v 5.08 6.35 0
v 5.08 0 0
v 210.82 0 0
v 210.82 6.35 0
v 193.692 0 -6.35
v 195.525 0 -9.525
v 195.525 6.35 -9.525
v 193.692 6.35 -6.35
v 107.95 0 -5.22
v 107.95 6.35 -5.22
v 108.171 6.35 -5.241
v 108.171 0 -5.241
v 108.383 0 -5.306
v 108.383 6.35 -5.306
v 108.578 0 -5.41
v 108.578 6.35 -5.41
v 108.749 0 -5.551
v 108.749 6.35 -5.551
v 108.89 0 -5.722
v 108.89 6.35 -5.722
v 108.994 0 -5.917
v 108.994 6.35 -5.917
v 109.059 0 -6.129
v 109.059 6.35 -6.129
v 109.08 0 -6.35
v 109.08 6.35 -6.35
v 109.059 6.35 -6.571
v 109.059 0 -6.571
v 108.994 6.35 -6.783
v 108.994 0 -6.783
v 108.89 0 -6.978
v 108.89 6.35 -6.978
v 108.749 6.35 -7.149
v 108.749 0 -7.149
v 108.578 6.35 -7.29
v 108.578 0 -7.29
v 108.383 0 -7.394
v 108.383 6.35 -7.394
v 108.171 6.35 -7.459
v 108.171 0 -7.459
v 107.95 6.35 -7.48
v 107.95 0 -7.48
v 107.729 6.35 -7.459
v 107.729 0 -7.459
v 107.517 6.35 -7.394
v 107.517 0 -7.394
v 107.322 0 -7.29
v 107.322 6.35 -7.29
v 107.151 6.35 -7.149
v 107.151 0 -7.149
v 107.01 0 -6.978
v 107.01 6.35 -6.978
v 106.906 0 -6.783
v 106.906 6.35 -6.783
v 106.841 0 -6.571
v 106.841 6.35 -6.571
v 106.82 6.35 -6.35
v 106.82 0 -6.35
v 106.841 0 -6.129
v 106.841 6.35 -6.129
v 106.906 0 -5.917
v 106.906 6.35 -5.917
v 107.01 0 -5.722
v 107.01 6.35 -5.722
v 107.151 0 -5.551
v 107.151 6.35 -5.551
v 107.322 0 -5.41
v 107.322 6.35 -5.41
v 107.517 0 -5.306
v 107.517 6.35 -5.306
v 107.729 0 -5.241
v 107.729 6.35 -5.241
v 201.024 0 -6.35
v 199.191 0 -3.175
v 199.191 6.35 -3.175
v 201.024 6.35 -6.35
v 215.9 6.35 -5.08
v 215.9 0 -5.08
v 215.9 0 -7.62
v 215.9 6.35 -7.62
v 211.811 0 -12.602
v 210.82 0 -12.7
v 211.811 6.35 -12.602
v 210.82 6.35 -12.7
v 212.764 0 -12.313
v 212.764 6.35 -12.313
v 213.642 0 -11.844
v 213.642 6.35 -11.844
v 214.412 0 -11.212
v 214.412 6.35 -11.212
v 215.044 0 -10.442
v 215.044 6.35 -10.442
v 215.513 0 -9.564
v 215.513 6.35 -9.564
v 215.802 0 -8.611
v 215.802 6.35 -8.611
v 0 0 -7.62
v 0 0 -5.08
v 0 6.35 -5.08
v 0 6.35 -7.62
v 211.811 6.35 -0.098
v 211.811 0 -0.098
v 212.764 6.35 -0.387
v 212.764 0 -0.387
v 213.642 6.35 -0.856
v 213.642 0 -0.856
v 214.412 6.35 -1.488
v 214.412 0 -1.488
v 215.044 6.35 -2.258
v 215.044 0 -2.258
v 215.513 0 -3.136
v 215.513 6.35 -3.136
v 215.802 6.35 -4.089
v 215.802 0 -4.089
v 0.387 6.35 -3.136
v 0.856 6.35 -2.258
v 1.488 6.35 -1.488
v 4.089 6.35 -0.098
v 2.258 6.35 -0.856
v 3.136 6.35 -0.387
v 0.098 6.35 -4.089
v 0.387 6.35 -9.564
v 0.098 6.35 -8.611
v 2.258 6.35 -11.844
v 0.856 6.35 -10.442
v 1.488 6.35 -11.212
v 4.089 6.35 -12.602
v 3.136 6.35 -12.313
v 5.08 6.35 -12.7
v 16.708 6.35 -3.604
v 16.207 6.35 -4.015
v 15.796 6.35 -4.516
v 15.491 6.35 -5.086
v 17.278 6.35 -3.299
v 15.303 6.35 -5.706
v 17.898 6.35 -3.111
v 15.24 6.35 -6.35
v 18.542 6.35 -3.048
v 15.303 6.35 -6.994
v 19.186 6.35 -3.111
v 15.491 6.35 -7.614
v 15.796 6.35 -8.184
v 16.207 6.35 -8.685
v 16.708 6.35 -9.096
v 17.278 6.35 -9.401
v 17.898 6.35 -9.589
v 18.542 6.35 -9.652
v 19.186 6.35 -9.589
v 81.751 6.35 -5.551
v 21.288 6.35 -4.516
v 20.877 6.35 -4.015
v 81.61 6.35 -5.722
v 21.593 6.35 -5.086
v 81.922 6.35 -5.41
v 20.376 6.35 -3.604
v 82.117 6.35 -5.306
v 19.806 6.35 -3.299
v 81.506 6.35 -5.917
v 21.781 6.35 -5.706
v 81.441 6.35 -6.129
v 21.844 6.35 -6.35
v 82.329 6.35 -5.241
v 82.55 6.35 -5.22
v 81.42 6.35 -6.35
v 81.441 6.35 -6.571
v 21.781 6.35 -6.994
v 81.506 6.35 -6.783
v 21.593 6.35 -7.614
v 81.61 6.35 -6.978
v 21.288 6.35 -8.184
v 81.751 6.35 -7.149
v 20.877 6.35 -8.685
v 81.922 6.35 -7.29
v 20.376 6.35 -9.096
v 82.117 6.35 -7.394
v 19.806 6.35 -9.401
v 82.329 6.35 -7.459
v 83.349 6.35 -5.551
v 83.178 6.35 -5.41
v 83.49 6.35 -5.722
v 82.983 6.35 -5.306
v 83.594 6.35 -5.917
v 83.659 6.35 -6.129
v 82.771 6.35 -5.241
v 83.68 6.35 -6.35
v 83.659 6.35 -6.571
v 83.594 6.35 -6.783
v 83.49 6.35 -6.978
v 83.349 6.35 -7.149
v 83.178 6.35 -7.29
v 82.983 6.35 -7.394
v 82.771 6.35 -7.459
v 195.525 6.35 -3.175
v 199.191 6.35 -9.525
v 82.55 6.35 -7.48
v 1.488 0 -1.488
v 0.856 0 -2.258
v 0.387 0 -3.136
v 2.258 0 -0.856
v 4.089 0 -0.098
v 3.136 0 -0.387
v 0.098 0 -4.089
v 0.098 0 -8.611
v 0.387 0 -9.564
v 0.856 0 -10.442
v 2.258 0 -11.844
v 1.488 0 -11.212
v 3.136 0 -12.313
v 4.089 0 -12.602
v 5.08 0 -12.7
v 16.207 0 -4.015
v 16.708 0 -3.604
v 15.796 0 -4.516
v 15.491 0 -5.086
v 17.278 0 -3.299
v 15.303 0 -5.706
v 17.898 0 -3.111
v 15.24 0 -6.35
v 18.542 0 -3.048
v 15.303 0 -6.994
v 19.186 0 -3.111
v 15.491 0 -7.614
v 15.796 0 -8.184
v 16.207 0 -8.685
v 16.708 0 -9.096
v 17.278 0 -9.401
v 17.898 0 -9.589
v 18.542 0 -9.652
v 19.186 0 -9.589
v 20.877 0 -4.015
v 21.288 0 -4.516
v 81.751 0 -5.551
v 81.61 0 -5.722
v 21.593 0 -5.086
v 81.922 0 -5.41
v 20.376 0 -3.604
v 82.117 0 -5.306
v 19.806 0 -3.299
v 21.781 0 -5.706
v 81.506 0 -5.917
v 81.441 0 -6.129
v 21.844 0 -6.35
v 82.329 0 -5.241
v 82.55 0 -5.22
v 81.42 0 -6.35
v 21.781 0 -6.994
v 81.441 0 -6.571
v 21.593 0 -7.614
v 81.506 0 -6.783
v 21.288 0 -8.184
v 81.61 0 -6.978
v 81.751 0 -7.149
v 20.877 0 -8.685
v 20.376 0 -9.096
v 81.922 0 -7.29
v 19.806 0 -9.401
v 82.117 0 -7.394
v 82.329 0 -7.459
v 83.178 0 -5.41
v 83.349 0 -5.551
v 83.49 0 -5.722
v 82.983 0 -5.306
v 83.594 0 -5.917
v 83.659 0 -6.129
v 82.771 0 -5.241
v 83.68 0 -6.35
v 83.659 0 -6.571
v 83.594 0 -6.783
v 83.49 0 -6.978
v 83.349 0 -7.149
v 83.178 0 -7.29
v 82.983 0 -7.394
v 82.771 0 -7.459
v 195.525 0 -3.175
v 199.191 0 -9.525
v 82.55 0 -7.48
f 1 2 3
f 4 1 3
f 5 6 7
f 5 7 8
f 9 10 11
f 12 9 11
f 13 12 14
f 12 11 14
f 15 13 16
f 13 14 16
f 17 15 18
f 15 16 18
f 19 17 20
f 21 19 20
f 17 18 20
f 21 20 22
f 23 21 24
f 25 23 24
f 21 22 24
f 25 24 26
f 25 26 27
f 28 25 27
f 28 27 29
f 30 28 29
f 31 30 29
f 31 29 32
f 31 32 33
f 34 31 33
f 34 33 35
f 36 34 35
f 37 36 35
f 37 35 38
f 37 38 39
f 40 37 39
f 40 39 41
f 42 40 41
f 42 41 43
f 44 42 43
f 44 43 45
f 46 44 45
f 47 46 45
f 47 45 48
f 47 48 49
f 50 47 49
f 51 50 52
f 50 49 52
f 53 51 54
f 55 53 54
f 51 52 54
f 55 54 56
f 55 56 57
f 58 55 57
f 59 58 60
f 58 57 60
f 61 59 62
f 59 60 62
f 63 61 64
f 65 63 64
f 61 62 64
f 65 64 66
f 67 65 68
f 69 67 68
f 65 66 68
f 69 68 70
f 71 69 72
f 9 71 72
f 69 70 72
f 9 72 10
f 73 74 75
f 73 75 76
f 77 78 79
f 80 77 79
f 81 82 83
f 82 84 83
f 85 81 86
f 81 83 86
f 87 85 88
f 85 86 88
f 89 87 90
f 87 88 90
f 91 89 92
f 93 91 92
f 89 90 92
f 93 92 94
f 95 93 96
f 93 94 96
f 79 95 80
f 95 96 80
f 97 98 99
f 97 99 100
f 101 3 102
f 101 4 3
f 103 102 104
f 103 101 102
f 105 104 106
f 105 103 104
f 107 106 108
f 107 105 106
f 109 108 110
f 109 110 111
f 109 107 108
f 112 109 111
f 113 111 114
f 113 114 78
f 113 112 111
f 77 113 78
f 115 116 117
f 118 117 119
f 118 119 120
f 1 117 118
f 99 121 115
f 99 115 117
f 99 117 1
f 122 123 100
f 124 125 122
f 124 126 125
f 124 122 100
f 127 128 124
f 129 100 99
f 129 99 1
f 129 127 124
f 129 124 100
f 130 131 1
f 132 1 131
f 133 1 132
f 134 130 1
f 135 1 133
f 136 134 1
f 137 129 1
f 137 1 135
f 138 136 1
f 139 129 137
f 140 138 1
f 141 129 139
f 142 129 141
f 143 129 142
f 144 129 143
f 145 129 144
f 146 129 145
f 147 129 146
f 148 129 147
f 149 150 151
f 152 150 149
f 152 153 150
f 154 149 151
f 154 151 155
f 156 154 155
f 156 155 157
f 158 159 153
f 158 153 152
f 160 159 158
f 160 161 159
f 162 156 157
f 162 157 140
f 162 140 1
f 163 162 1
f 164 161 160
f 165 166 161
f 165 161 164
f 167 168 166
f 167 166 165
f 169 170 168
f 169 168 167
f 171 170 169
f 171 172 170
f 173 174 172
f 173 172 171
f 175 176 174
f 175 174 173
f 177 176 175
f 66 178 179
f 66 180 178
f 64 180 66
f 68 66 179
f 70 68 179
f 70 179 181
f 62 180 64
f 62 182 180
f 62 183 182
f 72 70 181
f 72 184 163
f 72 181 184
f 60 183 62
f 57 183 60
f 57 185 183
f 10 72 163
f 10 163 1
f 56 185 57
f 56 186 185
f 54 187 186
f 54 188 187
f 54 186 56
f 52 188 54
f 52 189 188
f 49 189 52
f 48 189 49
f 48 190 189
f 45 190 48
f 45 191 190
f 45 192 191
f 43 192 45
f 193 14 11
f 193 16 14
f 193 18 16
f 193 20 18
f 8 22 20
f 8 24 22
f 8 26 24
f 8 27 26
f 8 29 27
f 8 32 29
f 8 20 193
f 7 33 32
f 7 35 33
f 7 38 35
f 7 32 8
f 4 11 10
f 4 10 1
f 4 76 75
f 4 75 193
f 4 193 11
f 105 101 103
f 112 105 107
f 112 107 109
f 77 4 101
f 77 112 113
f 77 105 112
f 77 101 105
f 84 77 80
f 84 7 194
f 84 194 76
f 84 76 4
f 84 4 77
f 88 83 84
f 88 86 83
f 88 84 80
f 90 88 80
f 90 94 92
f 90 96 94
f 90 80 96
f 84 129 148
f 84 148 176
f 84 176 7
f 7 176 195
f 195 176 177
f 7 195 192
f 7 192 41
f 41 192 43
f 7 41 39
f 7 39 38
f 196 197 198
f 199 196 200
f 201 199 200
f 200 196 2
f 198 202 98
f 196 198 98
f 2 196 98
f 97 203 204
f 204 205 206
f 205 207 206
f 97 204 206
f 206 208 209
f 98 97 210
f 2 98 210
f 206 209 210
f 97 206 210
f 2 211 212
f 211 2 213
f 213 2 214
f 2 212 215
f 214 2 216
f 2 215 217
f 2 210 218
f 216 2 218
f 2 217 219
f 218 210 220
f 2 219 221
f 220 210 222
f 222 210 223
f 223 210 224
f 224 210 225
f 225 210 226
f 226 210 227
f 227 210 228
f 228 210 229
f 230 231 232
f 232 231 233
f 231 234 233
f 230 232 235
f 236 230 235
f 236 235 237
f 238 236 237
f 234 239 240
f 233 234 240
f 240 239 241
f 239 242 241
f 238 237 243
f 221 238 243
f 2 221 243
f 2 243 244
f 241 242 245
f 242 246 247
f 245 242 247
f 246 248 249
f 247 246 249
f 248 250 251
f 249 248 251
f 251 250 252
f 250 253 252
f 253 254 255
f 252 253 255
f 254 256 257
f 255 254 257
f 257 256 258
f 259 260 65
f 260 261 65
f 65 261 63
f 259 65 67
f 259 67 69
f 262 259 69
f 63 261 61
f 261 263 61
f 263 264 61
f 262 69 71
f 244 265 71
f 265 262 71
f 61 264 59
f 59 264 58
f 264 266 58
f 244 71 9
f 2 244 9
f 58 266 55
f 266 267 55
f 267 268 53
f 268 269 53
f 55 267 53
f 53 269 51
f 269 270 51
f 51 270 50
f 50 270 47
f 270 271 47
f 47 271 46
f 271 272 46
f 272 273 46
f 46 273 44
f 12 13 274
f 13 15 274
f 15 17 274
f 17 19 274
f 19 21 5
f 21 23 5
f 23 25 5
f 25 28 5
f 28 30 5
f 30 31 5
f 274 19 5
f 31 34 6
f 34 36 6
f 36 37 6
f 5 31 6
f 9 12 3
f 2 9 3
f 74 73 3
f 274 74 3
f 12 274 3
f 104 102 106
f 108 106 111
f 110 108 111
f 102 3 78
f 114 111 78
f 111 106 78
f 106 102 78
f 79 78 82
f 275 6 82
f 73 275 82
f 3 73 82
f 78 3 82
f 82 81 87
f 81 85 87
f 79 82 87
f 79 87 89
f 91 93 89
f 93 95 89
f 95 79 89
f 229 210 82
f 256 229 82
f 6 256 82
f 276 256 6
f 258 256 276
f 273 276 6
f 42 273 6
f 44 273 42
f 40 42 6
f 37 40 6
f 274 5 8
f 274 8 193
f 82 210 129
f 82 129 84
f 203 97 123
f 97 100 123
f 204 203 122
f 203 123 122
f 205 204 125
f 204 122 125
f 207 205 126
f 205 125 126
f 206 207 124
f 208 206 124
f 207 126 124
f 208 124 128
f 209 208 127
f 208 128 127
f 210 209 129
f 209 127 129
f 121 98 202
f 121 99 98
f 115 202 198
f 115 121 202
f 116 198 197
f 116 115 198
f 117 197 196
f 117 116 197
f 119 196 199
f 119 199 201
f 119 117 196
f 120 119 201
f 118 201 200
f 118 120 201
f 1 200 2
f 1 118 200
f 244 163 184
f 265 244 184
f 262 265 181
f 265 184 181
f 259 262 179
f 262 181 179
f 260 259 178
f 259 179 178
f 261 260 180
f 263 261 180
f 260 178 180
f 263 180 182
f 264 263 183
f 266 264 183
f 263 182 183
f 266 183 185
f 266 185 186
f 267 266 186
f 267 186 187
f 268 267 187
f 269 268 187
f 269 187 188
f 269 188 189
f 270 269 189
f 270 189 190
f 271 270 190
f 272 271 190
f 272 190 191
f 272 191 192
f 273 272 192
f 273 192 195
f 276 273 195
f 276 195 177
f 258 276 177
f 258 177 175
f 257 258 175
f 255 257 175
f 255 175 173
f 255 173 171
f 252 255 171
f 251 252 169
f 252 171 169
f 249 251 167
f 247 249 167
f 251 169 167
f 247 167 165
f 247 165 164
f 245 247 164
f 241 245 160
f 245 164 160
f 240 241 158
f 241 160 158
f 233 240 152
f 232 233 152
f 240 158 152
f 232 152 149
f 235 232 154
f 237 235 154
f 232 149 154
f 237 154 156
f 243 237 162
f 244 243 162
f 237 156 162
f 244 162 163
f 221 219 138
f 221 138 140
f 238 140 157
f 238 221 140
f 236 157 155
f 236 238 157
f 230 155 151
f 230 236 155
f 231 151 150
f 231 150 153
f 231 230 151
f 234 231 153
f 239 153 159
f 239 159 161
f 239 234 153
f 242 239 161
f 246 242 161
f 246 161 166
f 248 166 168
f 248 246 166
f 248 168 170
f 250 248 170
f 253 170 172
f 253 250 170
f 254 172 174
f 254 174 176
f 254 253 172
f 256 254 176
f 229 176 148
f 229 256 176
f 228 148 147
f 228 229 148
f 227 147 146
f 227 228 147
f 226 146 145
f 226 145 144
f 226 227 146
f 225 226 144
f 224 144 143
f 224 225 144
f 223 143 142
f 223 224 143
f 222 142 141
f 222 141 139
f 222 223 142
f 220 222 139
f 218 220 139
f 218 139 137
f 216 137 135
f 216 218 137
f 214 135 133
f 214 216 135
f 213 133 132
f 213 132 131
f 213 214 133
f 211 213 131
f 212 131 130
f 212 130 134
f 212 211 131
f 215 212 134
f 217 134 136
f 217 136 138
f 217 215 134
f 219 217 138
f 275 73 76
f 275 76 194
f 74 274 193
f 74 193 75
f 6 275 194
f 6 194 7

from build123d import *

# Parameters (mm, degrees)
SKETCH1_W           = 215.9
SKETCH1_H           = 12.7
SKETCH1_R           = 3.302
BOSS_EXTRUDE1_DEPTH = 6.35
FILLET1_R           = 5.08
SKETCH4_R           = 1.1303
CUT_EXTRUDE1_DEPTH  = 21.59


with BuildPart() as part:
    # Sketch1 → Boss-Extrude1 (new body)
    with BuildSketch(Plane(origin=(0, 0, 0), x_dir=(1, 0, 0), z_dir=(0, 1, 0))):
        with Locations((107.95, 6.35)):
            Rectangle(SKETCH1_W, SKETCH1_H)
        with Locations(Location((18.542, 6.35, 0), (0, 0, 270))):
            Circle(SKETCH1_R, mode=Mode.SUBTRACT)
        Polygon((199.191087105, 9.525), (195.524912895, 9.525), (193.691825791, 6.35), (195.524912895, 3.175), (199.191087105, 3.175), (201.024174209, 6.35), align=None, mode=Mode.SUBTRACT)
    extrude(amount=BOSS_EXTRUDE1_DEPTH)

    # Fillet1
    fillet1_edges = [part.edges().sort_by_distance(p)[0] for p in [
        (0, 3.175, -12.7),
        (215.9, 3.175, -12.7),
        (215.9, 3.175, 0),
        (0, 3.175, 0),
    ]]
    fillet(fillet1_edges, radius=FILLET1_R)

    # Sketch4 → Cut-Extrude1 (cut)
    with BuildSketch(Plane(origin=(0, 6.35, 0), x_dir=(1, 0, 0), z_dir=(0, 1, 0))):
        with Locations(Location((107.95, 6.35, 0), (0, 0, 270))):
            Circle(SKETCH4_R)
        with Locations(Location((82.55, 6.35, 0), (0, 0, 270))):
            Circle(SKETCH4_R)
    extrude(amount=-CUT_EXTRUDE1_DEPTH, mode=Mode.SUBTRACT)


solid = part.part
